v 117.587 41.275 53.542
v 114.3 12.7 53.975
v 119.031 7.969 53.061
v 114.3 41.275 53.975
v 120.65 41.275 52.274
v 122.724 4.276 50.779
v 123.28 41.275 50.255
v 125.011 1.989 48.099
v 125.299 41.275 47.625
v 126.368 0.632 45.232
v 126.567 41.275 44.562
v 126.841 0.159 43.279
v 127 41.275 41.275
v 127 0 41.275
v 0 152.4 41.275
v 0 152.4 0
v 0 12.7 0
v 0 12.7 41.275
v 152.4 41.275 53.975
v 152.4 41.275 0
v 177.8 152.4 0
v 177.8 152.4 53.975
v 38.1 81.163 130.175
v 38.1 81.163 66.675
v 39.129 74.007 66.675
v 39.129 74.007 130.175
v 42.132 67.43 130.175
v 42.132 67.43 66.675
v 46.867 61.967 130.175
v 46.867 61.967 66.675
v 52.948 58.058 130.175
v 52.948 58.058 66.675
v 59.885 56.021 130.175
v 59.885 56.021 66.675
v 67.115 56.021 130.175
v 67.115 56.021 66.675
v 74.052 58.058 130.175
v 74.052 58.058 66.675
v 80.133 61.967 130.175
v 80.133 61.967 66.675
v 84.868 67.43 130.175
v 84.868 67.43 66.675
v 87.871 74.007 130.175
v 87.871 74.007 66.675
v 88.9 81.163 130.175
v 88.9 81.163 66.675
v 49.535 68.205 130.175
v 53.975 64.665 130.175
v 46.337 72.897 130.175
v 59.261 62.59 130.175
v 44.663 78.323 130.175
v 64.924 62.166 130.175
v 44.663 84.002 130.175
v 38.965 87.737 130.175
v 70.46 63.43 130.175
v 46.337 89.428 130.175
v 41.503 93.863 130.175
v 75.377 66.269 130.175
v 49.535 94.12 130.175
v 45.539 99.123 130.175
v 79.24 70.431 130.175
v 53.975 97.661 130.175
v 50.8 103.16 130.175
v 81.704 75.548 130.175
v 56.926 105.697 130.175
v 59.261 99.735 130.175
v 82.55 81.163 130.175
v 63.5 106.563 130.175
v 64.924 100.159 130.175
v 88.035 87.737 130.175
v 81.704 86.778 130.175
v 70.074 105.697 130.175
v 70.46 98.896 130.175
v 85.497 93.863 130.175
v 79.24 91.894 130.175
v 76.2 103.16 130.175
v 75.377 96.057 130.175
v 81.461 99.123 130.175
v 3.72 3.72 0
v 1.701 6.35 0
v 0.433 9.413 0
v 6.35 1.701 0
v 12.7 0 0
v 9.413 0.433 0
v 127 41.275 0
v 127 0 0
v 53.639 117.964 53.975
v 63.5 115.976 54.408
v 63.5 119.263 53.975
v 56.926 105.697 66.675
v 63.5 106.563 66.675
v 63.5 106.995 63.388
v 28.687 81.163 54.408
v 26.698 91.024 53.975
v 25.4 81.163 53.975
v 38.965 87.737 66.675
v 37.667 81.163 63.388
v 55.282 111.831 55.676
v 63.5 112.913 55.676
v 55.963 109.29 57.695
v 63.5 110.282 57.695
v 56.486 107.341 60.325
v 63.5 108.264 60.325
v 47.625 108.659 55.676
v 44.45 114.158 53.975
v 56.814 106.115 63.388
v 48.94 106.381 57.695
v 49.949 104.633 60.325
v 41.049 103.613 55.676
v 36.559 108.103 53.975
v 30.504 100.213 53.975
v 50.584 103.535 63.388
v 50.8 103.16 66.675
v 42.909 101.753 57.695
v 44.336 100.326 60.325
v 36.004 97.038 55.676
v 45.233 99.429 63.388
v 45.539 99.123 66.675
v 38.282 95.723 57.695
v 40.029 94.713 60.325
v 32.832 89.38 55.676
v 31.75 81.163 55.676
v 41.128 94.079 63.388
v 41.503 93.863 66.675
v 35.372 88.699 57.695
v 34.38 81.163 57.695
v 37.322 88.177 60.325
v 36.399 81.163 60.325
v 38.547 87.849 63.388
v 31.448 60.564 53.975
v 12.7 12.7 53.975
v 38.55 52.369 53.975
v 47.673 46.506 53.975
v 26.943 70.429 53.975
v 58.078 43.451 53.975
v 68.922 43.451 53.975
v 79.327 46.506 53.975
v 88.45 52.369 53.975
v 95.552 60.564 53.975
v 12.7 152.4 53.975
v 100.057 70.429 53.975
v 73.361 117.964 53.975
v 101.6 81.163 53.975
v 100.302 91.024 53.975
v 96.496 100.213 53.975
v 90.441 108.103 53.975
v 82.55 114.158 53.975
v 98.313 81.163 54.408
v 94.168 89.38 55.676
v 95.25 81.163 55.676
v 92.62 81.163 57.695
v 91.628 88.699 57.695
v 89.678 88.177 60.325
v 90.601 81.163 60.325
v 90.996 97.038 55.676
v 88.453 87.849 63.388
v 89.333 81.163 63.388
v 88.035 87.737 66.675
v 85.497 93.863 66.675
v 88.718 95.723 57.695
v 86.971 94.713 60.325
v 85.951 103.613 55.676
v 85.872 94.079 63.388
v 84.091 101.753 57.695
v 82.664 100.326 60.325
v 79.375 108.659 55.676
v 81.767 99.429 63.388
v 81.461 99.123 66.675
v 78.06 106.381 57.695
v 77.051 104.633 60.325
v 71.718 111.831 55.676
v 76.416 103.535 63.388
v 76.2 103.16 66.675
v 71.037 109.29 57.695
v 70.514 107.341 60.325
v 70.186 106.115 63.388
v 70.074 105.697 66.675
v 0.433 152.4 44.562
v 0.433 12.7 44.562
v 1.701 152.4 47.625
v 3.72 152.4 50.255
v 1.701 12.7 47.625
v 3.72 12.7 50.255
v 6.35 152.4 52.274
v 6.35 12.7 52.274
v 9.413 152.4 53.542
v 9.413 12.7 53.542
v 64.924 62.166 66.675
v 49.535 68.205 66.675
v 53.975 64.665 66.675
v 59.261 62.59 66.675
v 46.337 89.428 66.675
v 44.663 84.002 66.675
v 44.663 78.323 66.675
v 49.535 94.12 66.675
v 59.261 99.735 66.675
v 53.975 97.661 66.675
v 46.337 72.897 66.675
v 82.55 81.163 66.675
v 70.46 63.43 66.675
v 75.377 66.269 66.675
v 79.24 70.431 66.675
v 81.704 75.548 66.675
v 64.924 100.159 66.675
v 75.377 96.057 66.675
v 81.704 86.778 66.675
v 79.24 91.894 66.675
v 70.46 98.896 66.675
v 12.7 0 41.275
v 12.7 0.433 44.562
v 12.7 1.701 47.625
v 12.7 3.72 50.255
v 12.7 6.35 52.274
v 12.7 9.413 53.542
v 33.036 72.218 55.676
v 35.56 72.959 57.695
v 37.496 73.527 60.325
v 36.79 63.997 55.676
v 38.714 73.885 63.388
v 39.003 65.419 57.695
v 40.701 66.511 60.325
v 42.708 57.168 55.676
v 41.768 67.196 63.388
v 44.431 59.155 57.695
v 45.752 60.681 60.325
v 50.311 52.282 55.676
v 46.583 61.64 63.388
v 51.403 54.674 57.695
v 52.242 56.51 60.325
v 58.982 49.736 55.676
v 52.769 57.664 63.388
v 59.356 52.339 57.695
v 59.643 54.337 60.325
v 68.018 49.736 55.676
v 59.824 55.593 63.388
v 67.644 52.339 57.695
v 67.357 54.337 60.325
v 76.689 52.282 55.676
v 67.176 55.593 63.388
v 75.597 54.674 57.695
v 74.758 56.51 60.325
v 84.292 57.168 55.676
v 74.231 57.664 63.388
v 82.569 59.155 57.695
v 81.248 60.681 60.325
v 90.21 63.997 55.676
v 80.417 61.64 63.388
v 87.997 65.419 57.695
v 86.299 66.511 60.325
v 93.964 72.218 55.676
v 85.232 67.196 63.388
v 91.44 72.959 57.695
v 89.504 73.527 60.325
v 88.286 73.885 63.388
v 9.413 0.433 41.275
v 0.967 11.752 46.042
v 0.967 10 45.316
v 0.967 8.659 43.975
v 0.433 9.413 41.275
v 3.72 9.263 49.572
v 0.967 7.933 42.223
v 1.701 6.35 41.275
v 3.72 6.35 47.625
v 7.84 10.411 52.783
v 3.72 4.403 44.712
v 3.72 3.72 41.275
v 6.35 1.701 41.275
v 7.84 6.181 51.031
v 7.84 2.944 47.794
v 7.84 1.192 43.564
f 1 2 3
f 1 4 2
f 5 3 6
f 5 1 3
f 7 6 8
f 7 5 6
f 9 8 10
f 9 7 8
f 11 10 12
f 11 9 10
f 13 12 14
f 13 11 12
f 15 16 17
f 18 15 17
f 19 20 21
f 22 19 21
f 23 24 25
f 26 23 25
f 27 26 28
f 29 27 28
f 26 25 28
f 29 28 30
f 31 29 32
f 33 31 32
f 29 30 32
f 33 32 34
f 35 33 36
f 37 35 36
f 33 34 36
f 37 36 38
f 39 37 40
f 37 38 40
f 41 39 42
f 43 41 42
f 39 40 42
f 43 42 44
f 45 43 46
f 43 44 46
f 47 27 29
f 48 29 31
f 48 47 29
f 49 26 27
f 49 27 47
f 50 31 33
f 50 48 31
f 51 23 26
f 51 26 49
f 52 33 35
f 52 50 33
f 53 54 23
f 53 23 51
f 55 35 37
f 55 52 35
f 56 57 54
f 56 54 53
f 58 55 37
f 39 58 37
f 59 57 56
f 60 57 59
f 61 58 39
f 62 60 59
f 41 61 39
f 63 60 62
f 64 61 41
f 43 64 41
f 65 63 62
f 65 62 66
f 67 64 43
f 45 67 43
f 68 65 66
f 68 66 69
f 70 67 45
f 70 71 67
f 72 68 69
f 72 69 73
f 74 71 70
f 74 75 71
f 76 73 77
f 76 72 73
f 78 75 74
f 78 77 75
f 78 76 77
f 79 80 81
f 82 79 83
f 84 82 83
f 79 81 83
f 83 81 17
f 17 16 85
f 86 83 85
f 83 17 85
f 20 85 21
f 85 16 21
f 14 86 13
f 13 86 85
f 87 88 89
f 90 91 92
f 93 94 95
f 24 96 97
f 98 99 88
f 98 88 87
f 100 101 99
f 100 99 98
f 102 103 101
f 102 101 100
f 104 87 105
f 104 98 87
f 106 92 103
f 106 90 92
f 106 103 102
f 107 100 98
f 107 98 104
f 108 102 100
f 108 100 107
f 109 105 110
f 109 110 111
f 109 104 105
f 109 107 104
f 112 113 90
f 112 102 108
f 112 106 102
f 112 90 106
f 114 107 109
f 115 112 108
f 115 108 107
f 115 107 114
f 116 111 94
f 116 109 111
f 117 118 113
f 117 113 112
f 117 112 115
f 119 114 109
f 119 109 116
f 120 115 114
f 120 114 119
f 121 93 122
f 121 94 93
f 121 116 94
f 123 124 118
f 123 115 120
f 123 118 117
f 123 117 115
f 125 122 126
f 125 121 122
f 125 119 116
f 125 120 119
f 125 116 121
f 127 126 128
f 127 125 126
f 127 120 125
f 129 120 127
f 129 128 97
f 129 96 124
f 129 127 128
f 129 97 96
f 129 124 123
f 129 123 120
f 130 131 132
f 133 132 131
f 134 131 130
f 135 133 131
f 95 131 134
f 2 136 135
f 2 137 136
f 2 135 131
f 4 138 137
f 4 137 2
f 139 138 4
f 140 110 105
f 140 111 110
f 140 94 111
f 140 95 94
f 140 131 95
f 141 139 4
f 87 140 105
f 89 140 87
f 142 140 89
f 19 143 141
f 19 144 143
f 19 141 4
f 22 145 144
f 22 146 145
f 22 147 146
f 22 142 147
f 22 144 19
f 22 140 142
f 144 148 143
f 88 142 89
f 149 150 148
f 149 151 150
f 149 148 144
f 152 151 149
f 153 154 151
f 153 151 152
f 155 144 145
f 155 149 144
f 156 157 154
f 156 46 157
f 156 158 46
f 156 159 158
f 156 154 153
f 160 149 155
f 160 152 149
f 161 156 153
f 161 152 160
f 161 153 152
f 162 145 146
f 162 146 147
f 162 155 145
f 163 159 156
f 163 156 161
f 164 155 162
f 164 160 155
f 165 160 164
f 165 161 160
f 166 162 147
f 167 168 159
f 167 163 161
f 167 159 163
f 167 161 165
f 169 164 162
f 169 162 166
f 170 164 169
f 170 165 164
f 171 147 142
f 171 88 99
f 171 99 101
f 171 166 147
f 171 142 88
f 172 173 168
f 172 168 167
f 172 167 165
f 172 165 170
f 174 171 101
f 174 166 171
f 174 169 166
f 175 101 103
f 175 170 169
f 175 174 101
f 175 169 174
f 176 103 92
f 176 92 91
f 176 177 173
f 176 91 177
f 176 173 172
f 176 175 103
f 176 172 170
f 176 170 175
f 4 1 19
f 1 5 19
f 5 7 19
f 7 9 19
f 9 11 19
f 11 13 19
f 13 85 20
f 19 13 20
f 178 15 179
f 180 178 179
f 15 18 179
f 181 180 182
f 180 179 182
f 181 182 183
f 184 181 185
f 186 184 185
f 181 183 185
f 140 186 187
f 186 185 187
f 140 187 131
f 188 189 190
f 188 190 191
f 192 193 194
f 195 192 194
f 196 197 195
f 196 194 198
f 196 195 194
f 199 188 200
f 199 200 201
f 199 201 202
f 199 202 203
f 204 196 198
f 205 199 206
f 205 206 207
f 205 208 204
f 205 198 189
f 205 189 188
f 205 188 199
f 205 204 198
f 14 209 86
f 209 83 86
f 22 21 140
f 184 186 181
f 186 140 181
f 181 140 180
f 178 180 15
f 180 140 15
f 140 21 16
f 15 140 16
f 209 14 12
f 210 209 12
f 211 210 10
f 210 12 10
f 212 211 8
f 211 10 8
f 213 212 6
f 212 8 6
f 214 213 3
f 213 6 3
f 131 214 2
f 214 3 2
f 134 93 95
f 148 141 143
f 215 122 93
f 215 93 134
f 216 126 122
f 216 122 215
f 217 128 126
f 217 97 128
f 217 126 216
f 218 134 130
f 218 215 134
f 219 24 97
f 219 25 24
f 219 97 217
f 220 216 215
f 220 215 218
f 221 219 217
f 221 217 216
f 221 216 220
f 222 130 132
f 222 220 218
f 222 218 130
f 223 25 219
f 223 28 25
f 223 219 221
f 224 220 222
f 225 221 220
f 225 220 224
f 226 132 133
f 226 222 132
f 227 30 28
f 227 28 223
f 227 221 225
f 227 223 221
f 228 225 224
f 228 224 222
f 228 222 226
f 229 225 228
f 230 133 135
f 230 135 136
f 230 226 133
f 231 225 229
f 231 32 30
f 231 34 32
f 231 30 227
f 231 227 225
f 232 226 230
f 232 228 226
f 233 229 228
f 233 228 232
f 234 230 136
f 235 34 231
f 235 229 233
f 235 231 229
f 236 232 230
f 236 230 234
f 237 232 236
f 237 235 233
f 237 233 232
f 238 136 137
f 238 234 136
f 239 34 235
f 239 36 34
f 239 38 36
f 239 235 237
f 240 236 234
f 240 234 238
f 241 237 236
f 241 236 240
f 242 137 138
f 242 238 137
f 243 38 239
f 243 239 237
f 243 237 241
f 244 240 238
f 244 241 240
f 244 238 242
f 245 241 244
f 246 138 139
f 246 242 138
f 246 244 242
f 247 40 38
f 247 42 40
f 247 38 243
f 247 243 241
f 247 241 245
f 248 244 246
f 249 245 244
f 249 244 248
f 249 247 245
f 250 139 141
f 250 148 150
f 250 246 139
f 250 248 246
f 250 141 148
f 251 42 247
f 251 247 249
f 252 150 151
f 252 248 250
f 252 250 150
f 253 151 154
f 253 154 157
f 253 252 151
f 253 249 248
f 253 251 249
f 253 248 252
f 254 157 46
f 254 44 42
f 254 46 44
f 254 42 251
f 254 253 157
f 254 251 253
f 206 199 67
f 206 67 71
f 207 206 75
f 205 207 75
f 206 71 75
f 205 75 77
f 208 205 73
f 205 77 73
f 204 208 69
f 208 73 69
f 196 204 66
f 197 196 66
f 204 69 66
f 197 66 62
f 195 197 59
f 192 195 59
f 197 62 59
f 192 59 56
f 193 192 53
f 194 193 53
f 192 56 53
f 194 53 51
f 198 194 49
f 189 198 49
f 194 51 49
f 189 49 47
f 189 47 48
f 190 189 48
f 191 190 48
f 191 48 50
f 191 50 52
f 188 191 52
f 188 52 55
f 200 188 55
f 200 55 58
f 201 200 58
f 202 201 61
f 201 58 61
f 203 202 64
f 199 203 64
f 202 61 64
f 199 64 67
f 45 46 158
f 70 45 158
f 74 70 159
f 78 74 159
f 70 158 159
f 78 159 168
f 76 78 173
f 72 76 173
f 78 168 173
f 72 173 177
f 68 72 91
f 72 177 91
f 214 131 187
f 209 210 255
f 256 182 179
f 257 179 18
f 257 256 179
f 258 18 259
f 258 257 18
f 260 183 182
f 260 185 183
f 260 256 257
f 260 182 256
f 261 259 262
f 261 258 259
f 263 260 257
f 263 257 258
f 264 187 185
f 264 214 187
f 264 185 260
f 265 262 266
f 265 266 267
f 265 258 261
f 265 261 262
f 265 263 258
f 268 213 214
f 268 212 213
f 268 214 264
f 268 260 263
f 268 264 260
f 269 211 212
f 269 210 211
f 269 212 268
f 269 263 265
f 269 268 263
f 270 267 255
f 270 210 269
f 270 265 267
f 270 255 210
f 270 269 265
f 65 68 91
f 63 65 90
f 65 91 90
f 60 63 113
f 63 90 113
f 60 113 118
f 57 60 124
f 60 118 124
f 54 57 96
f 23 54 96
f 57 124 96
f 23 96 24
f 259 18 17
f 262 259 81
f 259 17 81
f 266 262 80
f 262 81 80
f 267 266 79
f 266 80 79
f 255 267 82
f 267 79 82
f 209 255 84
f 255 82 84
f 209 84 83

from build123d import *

# Parameters (mm, degrees)
F1_DEPTH = 53.975
F3_DEPTH = 76.2
F4_R     = 19.05
F5_DEPTH = 63.5
F6_R     = 12.7
F7_R     = 12.7


with BuildPart() as f1:
    # F0 (on Top) → F1 (new body)
    with BuildSketch(Plane.XY):
        Polygon((0, 152.4), (0, 0), (127, 0), (127, 41.275), (152.4, 41.275), (177.8, 152.4), align=None)
    extrude(amount=F1_DEPTH)

    # F2 (on face) → F3 (join)
    with BuildSketch(Plane.XY.offset(53.975)):
        with BuildLine():
            Line((63.5, 100.2127209187), (63.5, 106.5627209187))
            ThreePointArc((63.5, 106.5627209187), (45.5394877579, 99.1232331608), (38.1, 81.1627209187))
            Line((38.1, 81.1627209187), (44.45, 81.1627209187))
            ThreePointArc((44.45, 81.1627209187), (50.0296158184, 94.6331051003), (63.5, 100.2127209187))
        make_face()
        with BuildLine():
            ThreePointArc((88.9, 81.1627209187), (81.4605122421, 99.1232331608), (63.5, 106.5627209187))
            Line((63.5, 106.5627209187), (63.5, 100.2127209187))
            ThreePointArc((63.5, 100.2127209187), (76.9703841816, 94.6331051003), (82.55, 81.1627209187))
            ThreePointArc((82.55, 81.1627209187), (63.5, 62.1127209187), (44.45, 81.1627209187))
            Line((44.45, 81.1627209187), (38.1, 81.1627209187))
            ThreePointArc((38.1, 81.1627209187), (63.5, 55.7627209187), (88.9, 81.1627209187))
        make_face()
        with BuildLine():
            ThreePointArc((82.55, 81.1627209187), (76.9703841816, 94.6331051003), (63.5, 100.2127209187))
            Line((63.5, 100.2127209187), (63.5, 81.1627209187))
            Line((63.5, 81.1627209187), (44.45, 81.1627209187))
            ThreePointArc((44.45, 81.1627209187), (63.5, 62.1127209187), (82.55, 81.1627209187))
        make_face()
        with BuildLine():
            Line((63.5, 81.1627209187), (63.5, 100.2127209187))
            ThreePointArc((63.5, 100.2127209187), (50.0296158184, 94.6331051003), (44.45, 81.1627209187))
            Line((44.45, 81.1627209187), (63.5, 81.1627209187))
        make_face()
    extrude(amount=F3_DEPTH)

    # F4 (on face) → F5 (cut)
    with BuildSketch(Plane.XY.offset(130.175)):
        with Locations((63.5, 81.1627209187)):
            Circle(F4_R)
    extrude(amount=-F5_DEPTH, mode=Mode.SUBTRACT)

    # F6
    f6_edges = [f1.edges().sort_by_distance(p)[0] for p in [
        (88.9, 81.162721, 53.975),
        (127, 20.6375, 53.975),
        (63.5, 0, 53.975),
    ]]
    fillet(f6_edges, radius=F6_R)

    # F7
    f7_edges = [f1.edges().sort_by_distance(p)[0] for p in [
        (0, 82.55, 53.975),
    ]]
    fillet(f7_edges, radius=F7_R)


solid = f1.part
